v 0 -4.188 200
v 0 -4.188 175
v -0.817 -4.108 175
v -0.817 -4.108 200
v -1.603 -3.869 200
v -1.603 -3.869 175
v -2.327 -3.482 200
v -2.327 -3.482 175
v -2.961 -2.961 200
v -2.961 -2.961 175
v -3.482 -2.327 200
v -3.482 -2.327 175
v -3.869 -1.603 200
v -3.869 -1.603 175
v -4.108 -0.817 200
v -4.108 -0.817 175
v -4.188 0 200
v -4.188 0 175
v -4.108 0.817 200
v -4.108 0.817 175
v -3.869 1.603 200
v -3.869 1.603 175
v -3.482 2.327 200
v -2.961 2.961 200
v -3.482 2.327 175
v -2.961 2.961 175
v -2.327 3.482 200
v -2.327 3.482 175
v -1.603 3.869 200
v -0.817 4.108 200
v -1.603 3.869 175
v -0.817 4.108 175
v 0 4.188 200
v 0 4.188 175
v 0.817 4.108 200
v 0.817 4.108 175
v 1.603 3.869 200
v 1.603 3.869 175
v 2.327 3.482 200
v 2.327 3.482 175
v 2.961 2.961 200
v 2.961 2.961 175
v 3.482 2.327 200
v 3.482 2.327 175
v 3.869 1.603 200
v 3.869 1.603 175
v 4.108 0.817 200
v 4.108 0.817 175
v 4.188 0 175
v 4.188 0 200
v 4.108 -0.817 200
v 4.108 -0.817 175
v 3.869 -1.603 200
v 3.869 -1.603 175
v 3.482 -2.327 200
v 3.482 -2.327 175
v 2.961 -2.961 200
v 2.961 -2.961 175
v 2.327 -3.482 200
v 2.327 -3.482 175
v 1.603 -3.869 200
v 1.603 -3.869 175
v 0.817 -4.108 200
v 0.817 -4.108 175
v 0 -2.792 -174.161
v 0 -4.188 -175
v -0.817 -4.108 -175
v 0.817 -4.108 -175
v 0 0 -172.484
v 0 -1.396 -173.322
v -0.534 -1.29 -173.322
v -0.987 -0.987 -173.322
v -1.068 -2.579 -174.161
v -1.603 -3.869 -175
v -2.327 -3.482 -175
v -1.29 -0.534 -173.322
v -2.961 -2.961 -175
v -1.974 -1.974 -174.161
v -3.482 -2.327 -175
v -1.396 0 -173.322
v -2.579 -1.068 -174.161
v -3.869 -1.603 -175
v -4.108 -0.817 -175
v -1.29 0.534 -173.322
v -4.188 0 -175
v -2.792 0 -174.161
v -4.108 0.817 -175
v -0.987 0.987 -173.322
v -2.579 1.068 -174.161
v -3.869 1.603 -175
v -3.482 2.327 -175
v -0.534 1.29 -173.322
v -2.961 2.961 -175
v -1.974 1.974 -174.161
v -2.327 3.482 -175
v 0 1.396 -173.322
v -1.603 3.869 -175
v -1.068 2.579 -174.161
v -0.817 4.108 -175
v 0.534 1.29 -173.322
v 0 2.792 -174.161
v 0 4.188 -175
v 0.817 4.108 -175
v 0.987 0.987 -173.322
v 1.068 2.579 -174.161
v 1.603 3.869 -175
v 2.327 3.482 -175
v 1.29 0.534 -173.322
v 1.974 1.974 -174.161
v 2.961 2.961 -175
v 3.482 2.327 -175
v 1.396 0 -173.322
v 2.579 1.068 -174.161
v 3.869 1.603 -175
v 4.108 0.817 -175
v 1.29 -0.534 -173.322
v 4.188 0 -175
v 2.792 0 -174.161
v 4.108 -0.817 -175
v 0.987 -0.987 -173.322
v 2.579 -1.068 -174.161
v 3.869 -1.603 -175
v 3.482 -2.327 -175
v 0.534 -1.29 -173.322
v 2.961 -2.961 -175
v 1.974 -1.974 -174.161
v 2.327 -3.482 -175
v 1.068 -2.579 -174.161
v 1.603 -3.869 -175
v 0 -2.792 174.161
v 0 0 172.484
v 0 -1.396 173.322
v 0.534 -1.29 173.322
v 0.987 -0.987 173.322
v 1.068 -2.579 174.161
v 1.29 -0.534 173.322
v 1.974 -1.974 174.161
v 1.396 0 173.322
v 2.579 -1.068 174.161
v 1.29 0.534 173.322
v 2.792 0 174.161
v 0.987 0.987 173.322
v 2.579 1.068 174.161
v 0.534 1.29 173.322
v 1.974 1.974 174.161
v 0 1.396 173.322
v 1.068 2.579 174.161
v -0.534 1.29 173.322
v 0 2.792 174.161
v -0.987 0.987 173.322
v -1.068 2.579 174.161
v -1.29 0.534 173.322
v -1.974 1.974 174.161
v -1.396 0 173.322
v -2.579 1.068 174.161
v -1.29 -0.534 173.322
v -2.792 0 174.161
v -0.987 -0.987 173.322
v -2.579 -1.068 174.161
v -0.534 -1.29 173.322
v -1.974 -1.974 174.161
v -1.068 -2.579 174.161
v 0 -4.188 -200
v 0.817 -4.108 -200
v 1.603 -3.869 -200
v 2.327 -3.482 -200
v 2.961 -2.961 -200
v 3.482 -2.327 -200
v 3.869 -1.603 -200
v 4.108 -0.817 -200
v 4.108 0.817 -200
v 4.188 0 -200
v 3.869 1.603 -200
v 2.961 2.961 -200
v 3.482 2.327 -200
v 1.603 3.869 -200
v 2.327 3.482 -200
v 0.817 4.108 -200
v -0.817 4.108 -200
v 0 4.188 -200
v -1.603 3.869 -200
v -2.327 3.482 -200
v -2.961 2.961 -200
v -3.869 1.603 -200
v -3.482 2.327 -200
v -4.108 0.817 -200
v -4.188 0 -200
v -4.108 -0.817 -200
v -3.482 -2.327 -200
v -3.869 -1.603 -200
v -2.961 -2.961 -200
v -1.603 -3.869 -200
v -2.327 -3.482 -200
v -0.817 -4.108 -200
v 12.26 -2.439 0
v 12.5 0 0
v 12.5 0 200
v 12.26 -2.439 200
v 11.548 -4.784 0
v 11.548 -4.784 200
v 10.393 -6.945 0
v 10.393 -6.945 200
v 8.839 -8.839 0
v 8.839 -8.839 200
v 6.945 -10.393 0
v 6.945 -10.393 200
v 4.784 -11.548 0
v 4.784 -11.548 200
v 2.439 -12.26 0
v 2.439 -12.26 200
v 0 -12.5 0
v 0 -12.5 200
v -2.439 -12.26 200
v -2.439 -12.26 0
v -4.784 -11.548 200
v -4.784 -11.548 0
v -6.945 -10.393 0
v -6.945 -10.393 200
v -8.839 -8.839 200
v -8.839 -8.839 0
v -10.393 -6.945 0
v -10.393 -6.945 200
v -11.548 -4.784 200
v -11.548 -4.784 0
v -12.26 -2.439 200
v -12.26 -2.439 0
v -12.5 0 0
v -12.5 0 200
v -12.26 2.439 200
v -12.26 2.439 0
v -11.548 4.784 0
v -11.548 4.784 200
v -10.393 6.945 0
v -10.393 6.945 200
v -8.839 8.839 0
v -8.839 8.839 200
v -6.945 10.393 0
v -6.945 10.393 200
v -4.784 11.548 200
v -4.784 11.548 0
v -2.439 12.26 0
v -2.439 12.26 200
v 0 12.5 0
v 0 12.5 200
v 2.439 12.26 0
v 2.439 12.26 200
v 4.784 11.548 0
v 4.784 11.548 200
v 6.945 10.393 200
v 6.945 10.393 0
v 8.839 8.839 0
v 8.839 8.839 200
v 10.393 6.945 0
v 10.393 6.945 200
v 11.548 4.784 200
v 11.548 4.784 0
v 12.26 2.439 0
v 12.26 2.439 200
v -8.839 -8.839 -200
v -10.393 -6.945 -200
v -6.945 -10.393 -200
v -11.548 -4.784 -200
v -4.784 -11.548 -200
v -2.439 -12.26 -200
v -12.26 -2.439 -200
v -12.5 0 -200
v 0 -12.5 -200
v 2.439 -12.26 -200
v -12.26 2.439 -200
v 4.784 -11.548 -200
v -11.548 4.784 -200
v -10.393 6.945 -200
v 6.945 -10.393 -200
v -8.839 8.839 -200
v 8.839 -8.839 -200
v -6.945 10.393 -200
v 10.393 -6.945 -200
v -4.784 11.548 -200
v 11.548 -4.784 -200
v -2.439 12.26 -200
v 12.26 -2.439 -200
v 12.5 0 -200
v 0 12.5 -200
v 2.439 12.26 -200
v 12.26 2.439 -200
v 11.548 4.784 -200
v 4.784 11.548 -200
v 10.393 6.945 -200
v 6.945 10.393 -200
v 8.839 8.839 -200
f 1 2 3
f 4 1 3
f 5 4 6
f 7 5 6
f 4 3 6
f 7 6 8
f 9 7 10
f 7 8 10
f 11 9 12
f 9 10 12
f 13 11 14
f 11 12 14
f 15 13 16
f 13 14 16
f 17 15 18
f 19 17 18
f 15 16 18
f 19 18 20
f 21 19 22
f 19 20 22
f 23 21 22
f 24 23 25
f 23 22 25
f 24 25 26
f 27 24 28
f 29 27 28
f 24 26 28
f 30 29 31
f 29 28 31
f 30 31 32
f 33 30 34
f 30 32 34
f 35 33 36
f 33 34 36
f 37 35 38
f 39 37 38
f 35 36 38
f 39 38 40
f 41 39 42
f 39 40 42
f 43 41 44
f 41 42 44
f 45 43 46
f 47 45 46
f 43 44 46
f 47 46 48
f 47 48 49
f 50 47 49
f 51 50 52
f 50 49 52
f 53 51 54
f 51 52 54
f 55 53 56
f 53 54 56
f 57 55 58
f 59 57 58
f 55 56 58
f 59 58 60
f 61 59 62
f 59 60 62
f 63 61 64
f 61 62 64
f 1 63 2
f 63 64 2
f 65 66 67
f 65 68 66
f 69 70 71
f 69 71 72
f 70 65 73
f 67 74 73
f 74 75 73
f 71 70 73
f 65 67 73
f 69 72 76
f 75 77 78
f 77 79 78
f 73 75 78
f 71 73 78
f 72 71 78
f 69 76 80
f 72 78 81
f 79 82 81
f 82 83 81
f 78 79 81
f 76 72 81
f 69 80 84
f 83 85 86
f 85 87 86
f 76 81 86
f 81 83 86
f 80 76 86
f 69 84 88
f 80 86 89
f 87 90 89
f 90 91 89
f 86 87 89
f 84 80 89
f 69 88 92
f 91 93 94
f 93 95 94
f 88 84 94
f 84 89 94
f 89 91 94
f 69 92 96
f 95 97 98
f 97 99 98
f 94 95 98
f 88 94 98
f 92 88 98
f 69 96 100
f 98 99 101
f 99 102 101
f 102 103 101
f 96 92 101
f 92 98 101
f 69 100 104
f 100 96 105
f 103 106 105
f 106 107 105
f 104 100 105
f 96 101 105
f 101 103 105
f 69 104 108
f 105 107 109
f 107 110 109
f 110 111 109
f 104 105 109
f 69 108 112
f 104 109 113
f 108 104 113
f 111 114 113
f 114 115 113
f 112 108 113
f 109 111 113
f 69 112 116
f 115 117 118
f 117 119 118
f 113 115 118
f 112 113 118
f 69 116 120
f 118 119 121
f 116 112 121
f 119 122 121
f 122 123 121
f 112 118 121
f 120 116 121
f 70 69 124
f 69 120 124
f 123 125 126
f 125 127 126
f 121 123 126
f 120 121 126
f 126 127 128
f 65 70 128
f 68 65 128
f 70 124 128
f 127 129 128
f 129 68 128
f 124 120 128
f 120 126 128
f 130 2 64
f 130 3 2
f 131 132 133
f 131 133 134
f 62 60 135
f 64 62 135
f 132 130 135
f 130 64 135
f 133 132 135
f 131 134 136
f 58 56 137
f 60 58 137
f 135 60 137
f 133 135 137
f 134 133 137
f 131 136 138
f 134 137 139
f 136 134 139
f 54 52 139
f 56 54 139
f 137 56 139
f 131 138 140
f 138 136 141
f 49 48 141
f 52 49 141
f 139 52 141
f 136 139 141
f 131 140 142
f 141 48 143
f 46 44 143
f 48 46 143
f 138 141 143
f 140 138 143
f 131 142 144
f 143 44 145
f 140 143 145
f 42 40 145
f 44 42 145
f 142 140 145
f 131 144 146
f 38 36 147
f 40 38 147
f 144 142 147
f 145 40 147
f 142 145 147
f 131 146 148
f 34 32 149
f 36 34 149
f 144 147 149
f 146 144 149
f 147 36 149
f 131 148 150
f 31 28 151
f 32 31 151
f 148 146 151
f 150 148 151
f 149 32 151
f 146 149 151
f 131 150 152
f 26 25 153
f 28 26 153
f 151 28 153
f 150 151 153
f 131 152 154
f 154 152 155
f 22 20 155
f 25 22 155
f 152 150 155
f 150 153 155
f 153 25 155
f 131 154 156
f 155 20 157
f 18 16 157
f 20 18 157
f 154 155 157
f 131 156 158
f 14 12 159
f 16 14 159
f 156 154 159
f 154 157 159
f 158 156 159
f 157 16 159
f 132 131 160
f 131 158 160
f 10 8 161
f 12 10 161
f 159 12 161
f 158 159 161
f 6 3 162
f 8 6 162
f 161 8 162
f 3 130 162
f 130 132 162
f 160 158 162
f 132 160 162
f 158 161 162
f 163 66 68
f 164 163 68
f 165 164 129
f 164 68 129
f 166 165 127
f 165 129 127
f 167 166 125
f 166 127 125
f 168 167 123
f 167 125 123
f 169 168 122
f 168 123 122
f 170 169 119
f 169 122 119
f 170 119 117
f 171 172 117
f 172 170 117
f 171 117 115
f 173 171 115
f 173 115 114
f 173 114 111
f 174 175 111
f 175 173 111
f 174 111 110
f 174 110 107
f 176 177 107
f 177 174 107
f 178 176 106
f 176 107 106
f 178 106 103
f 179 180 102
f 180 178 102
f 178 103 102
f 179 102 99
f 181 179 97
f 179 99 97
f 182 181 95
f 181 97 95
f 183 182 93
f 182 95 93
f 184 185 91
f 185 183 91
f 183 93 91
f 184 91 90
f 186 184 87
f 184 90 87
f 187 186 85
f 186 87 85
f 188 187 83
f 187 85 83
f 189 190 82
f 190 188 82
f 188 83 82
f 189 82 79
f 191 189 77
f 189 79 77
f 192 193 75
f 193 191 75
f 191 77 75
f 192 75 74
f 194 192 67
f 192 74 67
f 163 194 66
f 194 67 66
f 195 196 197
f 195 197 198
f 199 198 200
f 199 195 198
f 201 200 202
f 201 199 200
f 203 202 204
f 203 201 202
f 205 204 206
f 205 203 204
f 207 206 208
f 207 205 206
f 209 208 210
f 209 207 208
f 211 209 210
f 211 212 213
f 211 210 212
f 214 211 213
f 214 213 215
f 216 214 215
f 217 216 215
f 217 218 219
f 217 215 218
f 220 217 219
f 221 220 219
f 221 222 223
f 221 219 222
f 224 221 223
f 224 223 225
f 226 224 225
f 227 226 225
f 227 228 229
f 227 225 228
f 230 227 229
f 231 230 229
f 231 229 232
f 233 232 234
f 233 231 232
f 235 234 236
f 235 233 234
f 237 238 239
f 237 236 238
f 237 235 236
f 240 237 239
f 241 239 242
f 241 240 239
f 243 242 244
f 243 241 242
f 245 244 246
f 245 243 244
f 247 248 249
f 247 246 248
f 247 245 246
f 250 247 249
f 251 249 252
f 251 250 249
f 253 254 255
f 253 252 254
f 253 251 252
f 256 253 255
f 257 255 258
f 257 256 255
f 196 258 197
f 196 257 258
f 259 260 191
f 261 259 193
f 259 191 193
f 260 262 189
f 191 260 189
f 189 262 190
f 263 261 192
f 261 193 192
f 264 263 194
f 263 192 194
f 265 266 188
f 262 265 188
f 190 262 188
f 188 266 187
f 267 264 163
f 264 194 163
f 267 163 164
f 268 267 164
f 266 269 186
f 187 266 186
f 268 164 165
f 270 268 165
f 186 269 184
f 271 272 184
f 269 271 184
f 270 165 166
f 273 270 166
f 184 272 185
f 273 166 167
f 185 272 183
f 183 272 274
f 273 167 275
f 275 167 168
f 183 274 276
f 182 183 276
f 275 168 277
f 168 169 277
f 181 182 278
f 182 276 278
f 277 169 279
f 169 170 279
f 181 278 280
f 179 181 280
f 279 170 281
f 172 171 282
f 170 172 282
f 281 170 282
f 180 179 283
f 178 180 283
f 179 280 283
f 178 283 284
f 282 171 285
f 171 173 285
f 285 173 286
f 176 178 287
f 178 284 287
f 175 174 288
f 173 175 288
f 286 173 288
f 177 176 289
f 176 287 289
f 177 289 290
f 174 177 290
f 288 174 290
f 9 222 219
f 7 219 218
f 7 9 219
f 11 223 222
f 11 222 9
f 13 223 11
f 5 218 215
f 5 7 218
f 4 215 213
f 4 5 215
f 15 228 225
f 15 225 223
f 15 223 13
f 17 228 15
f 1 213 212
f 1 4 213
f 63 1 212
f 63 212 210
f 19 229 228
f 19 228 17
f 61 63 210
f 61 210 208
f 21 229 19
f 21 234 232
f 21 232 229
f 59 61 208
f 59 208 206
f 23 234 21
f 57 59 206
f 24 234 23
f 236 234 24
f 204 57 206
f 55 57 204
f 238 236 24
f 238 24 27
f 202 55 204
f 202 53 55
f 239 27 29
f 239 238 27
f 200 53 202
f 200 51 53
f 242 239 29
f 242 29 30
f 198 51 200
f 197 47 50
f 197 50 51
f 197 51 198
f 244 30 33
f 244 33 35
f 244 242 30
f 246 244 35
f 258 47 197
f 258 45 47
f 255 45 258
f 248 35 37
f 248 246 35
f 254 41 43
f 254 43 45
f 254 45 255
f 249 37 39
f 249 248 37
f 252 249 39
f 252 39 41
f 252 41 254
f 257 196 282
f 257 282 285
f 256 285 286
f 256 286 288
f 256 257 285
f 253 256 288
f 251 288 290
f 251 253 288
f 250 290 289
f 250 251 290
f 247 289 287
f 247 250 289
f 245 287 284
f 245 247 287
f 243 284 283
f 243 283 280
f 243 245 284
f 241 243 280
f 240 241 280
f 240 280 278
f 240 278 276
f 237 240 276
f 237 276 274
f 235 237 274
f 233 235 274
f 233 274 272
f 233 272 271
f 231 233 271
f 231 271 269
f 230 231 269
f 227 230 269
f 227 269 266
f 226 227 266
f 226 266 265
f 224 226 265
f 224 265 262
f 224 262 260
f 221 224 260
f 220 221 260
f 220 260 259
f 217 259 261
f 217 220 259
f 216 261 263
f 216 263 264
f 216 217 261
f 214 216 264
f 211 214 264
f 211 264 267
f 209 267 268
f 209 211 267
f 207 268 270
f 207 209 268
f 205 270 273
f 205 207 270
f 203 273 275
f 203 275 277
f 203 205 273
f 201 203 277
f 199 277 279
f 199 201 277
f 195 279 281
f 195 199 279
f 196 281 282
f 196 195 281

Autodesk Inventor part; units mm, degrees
ref_plane "YZ Plane" through (0, 0, 0) normal (1, 0, 0) x (0, 1, 0)
ref_plane "XZ Plane" through (0, 0, 0) normal (0, 1, 0) x (-1, 0, 0)
ref_plane "XY Plane" through (0, 0, 0) normal (0, 0, 1) x (1, 0, 0)
sketch "Sketch1" plane through (0, 0, 0) normal (0, 0, 1) x (1, 0, 0)
  circle A0 centre (0, 0) radius 12.5
  dimension "d0" = 25
extrude "Extrusion1" add sketch "Sketch1" along normal mid plane 400
sketch "Sketch2" plane through (0, 0, 200) normal (0, 0, 1) x (1, 0, 0)
  circle A0 centre (0, 0) radius 12.5 projected
hole "Hole1" at (0, 0, 200) direction (0, 0, -1) diameter 8.376 depth 25 tip angle 118 thread size "M10x1.5" class "6H" standard "ISO Metric profile"
mirror "Mirror1" about plane through (0, 0, 0) normal (0, 0, 1) of "Hole1"
properties part number "ADSK-MH-10018" material "Steel, Mild"
